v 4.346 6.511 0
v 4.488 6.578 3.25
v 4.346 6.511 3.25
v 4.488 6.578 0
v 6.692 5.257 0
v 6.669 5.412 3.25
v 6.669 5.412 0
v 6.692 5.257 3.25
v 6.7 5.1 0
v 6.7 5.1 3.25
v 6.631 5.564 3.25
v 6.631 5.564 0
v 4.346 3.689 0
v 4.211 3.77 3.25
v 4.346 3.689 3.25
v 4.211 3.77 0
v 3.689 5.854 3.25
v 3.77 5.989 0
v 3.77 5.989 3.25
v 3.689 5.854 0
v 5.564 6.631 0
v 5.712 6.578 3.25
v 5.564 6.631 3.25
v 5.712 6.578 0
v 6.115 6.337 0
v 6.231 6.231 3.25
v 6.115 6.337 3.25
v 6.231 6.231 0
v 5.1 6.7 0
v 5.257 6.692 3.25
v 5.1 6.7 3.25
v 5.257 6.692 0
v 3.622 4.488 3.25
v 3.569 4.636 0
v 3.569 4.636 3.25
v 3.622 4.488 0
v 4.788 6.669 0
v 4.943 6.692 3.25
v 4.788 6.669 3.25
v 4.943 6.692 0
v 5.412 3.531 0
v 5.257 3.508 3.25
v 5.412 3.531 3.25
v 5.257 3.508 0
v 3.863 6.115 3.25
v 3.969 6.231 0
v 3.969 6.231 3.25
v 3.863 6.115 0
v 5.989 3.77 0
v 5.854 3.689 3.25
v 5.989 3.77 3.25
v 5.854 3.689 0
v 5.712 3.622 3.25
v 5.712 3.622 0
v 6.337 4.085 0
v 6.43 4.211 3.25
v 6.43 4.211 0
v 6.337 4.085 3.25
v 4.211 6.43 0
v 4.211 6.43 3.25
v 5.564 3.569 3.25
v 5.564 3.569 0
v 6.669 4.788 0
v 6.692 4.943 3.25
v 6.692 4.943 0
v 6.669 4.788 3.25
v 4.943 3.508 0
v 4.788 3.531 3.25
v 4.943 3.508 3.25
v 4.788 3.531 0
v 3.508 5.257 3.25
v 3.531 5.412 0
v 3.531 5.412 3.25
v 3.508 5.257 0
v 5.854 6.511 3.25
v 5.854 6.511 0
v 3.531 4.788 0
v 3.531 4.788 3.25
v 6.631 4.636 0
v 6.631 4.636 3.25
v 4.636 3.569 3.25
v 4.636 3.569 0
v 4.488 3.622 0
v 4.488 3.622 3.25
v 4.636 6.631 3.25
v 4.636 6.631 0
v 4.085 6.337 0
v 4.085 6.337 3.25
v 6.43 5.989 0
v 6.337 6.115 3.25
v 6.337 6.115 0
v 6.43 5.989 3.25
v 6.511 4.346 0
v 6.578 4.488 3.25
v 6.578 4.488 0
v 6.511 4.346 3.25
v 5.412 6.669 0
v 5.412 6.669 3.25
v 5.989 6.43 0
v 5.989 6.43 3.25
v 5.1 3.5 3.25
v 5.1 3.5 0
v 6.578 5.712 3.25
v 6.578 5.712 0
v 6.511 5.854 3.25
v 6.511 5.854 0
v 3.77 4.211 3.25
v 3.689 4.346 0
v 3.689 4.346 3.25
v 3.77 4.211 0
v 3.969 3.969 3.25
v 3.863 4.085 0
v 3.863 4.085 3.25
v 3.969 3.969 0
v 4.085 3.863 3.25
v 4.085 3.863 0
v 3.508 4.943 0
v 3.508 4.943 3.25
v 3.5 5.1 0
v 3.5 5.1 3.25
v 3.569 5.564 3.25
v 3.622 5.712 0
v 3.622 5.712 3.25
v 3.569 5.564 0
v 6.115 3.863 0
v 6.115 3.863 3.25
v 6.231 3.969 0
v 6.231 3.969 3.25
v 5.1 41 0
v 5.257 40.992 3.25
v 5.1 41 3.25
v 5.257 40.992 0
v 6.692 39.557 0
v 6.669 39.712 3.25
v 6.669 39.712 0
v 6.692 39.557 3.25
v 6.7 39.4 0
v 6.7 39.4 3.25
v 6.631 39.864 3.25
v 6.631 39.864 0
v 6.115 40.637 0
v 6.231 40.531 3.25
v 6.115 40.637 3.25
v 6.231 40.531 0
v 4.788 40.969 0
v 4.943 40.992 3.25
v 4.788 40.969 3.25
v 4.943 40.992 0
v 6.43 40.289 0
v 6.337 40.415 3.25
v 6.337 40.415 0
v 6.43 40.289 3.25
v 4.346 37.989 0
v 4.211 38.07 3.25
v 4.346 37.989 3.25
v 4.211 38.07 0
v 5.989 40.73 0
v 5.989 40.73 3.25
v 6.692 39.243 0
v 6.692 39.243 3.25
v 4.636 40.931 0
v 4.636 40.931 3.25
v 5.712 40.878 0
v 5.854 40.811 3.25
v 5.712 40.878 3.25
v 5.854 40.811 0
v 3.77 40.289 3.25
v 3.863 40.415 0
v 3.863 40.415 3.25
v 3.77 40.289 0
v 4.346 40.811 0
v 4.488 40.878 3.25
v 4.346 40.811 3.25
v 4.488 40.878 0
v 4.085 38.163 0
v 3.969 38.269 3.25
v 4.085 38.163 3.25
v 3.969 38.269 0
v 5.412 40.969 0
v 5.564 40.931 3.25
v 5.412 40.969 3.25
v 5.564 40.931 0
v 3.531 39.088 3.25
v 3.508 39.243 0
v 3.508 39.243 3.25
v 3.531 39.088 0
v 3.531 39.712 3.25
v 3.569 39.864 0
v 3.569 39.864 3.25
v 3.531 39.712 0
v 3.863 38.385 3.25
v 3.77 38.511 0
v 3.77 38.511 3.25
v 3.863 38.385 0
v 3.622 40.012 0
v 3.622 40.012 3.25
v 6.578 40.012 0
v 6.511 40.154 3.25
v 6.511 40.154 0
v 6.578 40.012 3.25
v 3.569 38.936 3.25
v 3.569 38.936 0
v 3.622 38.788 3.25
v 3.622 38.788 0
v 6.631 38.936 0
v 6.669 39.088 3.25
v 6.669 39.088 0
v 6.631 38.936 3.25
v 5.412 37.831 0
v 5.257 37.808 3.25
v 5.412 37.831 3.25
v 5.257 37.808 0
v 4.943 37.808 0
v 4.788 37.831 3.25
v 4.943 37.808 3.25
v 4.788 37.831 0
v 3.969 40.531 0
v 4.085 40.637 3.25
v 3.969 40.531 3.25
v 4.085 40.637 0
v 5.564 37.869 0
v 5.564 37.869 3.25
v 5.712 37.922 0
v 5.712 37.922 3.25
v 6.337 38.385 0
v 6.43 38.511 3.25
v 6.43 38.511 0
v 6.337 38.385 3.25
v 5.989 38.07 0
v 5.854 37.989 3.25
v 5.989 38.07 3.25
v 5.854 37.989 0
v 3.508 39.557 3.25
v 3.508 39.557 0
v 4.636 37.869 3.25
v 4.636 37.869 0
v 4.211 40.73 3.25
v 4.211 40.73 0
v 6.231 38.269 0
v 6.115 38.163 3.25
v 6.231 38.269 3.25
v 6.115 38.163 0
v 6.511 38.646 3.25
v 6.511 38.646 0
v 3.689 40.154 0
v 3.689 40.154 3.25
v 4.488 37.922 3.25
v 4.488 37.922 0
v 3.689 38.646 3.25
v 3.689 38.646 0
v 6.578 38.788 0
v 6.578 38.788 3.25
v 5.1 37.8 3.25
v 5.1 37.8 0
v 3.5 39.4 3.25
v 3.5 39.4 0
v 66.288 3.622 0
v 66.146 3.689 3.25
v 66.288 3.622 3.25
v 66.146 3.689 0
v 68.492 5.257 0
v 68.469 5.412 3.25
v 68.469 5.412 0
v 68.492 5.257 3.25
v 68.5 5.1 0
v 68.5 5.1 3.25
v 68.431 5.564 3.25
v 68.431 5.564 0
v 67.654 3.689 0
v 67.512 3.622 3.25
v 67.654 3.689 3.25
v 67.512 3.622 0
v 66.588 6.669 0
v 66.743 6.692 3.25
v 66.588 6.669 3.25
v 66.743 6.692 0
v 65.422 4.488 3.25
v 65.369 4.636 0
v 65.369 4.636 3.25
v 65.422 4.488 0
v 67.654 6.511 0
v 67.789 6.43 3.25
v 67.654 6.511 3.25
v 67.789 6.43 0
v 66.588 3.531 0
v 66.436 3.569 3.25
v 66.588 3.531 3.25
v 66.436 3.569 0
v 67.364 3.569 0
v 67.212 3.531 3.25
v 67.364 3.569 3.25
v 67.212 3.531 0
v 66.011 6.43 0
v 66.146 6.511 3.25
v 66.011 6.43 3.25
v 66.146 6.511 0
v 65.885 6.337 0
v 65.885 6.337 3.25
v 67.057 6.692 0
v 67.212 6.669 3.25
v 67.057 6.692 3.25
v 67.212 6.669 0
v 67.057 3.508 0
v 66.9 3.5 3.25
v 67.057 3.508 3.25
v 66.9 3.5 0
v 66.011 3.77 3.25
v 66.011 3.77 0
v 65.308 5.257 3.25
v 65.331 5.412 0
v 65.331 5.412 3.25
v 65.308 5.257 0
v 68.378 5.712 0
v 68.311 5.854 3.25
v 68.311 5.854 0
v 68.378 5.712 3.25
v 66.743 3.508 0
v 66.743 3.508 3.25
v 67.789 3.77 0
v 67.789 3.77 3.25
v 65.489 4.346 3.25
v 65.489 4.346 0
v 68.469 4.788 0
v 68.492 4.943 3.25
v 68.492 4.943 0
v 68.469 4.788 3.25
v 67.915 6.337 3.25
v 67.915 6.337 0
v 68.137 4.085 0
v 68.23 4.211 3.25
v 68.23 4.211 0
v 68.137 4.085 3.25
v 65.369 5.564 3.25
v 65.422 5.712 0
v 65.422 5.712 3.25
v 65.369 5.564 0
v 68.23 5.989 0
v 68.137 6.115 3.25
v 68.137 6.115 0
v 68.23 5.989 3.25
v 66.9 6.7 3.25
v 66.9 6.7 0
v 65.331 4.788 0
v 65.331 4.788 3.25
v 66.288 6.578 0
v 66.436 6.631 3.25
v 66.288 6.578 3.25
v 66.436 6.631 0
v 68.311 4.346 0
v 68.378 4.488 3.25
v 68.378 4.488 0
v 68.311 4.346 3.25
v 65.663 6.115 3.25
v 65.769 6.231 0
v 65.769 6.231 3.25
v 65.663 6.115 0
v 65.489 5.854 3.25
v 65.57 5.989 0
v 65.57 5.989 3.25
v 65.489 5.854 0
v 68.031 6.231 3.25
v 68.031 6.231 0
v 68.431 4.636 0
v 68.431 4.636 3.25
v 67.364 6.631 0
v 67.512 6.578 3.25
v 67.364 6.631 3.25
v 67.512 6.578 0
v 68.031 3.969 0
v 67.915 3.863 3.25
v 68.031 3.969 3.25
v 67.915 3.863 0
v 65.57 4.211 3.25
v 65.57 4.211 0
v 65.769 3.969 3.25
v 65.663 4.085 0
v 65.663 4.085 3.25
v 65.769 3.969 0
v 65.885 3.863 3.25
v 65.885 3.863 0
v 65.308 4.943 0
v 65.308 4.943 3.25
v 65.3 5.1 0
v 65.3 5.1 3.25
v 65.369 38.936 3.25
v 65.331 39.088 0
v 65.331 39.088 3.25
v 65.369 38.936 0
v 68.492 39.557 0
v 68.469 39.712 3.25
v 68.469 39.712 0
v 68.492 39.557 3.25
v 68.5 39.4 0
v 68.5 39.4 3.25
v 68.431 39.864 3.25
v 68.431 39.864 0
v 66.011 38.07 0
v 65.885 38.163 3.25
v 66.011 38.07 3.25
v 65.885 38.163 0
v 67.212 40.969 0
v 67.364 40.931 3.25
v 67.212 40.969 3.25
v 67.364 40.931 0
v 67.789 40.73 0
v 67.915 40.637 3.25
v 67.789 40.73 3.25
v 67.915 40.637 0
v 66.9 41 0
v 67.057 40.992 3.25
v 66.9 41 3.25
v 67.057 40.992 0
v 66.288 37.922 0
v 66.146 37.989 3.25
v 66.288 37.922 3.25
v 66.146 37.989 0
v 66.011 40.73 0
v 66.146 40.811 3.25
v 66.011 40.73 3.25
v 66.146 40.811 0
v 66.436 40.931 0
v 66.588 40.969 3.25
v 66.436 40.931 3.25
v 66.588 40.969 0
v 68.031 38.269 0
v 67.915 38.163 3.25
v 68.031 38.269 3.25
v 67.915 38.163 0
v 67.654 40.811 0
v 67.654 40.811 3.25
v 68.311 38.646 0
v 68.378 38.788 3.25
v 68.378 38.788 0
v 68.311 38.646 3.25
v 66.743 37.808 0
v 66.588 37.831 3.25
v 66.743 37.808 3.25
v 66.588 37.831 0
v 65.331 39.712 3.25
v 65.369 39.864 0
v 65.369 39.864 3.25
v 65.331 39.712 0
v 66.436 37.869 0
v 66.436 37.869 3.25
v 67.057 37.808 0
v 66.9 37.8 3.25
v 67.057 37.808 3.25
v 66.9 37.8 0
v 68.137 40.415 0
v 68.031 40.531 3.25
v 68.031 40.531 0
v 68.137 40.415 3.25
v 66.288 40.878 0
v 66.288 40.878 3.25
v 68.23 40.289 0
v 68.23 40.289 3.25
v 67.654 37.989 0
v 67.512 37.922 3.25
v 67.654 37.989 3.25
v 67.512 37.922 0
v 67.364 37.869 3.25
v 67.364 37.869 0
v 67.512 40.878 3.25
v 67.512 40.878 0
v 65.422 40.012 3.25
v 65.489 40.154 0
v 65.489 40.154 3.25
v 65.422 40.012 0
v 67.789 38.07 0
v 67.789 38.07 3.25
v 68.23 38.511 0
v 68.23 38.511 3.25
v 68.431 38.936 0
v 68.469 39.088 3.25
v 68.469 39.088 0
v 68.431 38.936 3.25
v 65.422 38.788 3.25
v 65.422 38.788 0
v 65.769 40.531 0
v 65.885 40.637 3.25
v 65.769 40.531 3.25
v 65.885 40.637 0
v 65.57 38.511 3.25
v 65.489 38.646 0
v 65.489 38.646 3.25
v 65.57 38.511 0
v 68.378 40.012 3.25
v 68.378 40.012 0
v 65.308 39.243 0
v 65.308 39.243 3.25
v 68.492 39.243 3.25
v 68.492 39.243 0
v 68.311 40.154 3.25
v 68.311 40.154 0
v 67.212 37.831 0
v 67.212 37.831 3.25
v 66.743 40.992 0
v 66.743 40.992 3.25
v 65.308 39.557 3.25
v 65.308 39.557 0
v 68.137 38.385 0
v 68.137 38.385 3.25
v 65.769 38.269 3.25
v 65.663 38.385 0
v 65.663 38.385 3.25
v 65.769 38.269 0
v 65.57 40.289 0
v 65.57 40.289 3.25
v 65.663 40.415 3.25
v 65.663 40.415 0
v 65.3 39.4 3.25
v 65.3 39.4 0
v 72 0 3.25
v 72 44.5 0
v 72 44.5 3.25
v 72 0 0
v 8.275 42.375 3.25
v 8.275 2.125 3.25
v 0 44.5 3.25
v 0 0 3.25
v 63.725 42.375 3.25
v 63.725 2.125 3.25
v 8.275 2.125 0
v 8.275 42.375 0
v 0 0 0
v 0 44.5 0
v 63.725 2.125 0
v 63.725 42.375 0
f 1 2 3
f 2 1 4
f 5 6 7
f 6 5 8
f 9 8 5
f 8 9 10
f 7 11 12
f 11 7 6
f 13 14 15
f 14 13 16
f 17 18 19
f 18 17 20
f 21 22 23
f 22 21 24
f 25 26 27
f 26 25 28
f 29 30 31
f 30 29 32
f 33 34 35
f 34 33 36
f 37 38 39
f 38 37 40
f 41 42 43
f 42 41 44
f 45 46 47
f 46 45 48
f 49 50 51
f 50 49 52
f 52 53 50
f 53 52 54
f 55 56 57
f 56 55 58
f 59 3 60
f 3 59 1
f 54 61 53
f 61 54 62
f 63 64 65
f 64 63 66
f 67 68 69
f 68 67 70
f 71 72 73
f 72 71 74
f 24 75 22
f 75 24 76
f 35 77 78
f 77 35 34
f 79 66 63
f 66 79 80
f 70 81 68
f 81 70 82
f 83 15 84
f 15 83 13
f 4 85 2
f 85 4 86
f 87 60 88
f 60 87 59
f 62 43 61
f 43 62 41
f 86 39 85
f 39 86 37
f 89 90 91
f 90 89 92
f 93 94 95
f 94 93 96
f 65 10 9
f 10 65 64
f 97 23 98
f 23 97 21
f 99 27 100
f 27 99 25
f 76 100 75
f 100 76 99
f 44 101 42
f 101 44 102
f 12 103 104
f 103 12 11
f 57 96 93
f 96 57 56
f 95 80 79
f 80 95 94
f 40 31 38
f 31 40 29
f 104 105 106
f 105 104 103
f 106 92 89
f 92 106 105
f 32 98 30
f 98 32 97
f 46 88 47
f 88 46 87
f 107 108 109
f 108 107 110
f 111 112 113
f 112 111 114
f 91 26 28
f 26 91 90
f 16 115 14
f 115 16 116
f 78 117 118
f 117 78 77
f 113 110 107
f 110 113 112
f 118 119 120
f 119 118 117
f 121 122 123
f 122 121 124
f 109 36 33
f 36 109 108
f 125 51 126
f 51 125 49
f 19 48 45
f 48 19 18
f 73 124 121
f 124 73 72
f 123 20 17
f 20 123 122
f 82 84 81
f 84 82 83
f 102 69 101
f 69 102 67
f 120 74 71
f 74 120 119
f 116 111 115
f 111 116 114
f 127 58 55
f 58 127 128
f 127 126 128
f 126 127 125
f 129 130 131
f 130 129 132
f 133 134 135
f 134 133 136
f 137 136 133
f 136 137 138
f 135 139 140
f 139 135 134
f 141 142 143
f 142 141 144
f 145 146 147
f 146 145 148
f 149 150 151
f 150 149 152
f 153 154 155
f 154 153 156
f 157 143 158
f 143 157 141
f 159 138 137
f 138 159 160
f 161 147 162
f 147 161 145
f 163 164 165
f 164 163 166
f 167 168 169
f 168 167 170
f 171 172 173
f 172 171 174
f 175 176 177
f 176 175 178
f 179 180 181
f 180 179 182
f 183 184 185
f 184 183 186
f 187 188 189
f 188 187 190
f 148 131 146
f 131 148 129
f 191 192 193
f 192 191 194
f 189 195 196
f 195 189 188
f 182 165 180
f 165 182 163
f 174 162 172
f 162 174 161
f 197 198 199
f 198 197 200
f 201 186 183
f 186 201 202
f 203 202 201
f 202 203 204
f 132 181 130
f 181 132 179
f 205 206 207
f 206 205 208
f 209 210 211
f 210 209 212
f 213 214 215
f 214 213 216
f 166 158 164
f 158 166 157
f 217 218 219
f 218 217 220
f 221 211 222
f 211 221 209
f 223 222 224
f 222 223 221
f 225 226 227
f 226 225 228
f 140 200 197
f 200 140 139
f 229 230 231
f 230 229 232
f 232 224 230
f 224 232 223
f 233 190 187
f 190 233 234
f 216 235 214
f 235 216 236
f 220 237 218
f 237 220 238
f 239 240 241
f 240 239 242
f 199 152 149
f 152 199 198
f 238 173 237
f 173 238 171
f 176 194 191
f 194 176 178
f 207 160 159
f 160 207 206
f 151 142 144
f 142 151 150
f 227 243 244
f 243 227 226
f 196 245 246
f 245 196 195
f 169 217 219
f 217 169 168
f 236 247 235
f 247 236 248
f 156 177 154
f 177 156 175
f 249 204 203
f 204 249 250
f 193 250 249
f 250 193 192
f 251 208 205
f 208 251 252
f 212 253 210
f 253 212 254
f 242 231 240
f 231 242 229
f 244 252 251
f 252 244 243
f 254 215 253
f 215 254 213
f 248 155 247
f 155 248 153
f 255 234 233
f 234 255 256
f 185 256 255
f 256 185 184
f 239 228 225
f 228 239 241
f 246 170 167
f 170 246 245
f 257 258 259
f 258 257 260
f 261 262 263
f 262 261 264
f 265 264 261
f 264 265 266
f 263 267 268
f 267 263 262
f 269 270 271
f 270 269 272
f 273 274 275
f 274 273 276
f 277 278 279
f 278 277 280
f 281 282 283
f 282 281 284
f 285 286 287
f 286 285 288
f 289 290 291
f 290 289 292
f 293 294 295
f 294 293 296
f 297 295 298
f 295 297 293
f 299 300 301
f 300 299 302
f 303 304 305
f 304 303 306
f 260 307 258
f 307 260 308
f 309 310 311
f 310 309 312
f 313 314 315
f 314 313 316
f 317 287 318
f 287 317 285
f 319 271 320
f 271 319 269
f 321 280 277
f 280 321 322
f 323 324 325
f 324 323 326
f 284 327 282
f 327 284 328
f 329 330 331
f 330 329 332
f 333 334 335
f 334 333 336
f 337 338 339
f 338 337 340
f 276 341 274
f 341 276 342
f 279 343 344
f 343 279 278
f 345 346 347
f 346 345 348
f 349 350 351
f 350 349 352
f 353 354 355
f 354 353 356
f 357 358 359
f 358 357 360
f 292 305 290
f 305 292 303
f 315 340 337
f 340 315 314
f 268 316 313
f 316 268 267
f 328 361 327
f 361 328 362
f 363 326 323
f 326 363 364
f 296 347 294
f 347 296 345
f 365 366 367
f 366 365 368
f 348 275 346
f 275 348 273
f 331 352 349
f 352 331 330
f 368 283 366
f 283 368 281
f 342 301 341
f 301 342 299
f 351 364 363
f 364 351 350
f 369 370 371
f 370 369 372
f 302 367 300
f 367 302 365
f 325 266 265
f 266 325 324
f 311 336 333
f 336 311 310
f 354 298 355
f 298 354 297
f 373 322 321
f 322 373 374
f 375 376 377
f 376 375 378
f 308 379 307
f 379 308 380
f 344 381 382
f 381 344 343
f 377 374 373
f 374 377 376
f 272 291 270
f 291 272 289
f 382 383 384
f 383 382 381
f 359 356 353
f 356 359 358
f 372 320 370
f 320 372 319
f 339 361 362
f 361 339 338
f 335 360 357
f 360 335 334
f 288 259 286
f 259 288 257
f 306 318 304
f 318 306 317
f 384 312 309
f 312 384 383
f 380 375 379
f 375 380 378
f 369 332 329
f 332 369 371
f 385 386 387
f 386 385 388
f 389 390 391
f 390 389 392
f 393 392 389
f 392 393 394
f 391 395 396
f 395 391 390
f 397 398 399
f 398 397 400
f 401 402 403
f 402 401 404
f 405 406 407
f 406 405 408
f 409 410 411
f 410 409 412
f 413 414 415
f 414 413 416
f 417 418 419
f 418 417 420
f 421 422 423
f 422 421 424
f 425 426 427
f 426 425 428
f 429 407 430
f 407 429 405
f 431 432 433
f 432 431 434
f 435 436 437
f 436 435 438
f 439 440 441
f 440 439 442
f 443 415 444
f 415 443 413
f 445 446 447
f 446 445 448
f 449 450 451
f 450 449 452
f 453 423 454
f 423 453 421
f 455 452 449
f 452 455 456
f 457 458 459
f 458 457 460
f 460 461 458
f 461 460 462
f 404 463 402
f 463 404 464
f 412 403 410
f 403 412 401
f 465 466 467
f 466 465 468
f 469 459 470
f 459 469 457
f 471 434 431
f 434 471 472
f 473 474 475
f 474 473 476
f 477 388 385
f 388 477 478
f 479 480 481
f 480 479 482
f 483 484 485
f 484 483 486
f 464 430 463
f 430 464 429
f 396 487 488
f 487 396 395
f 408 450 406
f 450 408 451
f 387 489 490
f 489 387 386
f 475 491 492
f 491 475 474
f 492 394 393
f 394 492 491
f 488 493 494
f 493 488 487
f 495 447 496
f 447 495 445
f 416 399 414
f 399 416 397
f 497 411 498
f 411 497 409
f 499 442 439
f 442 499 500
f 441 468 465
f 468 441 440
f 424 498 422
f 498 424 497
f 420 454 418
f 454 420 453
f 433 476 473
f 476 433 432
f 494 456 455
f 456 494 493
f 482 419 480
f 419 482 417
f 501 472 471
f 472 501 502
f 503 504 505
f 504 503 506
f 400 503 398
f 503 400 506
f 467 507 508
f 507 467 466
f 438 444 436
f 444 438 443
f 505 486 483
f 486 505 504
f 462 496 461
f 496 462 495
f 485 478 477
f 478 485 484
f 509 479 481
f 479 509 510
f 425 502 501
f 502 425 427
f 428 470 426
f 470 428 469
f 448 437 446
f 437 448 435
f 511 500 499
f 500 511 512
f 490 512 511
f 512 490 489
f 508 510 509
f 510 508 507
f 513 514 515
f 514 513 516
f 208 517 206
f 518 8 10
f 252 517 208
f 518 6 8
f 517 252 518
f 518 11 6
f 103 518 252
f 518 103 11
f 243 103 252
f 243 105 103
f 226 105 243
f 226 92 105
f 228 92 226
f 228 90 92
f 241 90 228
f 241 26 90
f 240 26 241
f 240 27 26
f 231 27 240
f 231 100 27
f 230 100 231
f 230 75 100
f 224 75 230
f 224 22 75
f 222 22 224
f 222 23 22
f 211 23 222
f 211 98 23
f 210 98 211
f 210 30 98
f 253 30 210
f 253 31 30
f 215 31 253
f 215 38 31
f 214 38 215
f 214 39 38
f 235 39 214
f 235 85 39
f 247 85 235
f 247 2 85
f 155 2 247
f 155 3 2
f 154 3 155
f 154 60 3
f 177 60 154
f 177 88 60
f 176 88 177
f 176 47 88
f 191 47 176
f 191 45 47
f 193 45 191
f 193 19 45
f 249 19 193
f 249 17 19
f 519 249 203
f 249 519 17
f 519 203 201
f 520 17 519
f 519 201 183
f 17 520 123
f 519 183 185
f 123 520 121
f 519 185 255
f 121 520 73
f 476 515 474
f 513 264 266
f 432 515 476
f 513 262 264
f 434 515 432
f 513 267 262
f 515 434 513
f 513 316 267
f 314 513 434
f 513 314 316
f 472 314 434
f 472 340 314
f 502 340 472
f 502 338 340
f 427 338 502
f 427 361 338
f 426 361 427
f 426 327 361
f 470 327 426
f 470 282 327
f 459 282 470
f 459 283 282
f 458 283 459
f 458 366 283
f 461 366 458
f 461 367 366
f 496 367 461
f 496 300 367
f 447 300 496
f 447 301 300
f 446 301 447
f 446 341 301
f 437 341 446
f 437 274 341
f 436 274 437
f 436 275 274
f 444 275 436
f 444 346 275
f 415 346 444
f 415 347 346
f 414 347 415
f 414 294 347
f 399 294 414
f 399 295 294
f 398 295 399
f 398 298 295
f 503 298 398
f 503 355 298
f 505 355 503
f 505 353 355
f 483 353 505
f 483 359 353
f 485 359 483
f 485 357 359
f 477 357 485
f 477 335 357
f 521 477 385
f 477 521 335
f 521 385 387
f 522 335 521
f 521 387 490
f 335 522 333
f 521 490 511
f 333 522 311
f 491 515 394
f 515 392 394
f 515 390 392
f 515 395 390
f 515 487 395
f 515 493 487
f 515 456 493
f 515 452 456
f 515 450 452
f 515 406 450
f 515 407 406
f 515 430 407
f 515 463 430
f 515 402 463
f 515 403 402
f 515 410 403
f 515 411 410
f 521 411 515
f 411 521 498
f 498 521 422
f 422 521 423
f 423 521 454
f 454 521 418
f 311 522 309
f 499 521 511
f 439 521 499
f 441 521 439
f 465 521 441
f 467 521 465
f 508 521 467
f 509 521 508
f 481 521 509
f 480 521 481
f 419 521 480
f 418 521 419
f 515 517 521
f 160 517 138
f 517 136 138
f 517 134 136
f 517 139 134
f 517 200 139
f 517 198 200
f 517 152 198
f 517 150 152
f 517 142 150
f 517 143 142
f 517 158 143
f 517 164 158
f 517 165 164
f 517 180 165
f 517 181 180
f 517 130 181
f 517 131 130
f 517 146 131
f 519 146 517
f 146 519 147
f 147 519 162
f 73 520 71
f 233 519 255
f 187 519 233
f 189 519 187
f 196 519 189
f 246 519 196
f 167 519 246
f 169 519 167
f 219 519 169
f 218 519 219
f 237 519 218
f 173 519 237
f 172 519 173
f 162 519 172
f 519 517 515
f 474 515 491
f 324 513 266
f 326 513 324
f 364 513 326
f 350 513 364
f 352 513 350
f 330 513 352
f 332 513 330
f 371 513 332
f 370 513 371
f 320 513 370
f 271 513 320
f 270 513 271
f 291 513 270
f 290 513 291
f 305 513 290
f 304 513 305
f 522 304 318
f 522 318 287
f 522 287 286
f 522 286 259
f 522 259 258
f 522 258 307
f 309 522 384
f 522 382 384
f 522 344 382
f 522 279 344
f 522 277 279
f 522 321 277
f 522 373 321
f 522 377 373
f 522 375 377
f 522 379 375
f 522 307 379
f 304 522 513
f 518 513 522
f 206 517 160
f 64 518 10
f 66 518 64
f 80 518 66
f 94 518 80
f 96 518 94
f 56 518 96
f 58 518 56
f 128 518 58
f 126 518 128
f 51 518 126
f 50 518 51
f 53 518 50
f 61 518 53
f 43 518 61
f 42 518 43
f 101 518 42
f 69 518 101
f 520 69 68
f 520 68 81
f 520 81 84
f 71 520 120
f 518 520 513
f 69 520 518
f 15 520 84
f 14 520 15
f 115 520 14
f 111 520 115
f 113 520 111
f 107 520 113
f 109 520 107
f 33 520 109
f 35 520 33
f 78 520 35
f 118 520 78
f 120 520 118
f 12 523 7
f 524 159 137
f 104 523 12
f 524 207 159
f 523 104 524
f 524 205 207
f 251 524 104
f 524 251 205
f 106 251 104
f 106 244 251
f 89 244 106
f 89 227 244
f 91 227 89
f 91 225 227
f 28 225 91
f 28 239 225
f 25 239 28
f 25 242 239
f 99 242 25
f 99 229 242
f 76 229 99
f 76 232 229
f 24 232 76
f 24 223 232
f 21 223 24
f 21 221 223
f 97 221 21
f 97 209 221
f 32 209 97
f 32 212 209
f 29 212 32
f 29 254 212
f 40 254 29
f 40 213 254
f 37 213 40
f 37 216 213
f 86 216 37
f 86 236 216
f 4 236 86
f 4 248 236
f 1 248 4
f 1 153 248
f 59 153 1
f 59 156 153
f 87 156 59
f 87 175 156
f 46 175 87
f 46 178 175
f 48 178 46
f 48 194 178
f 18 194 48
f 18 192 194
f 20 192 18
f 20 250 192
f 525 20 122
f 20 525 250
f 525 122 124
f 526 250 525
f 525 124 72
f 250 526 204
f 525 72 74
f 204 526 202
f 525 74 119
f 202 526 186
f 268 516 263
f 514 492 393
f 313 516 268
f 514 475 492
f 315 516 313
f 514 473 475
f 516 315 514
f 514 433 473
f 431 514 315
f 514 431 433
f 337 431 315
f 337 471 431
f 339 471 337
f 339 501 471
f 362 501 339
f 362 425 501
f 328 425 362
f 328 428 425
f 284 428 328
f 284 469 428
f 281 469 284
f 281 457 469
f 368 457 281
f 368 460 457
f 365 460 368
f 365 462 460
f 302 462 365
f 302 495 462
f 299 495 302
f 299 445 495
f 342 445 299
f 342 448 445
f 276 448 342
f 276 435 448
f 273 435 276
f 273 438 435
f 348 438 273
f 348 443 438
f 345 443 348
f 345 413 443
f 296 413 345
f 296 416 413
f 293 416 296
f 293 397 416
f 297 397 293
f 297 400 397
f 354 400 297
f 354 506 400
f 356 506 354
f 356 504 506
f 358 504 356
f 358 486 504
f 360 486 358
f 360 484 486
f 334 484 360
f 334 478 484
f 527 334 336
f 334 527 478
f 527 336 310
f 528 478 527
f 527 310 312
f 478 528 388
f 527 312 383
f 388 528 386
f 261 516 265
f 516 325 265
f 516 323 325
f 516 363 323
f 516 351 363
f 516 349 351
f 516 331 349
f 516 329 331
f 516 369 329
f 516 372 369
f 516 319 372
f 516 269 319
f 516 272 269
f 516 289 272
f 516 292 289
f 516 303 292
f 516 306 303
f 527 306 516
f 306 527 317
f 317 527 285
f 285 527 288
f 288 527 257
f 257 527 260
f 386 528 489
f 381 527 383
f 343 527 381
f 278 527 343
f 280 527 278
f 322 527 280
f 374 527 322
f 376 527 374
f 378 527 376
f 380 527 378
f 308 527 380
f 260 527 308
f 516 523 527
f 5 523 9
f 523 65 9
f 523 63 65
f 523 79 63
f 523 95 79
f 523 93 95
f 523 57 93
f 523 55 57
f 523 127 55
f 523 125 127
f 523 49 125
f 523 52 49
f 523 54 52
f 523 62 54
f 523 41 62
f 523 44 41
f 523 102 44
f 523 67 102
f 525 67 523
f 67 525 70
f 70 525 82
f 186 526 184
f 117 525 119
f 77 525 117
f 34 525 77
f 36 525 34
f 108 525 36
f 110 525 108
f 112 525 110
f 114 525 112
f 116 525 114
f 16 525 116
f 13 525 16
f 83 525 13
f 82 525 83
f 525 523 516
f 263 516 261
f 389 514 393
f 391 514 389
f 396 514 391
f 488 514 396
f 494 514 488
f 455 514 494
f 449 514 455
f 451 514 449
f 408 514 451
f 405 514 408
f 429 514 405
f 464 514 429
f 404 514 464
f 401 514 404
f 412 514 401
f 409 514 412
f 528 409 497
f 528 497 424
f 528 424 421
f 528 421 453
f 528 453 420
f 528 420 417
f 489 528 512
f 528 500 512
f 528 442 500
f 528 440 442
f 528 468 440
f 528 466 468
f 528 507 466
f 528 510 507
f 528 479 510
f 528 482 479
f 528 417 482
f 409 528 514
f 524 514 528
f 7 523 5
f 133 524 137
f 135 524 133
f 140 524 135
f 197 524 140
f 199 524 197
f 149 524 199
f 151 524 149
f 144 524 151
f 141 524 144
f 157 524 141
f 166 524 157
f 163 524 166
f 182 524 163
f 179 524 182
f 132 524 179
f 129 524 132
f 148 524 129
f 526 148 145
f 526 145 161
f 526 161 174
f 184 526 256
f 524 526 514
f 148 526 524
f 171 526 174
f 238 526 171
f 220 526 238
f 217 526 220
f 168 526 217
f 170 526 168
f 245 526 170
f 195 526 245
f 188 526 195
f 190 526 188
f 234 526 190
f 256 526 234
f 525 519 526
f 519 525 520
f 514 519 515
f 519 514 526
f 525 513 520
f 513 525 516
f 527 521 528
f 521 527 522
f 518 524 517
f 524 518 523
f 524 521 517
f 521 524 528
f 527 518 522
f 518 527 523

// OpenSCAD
// LCD top bezel / faceplate for original 67.5 x 40mm PCB holder

// ===== PARAMETERS =====

pcb_x = 67.5;
pcb_y = 40;

clearance = 0.25;   // per side

wall = 2;

// same footprint as holder
inner_x = pcb_x + clearance * 2;
inner_y = pcb_y + clearance * 2;

outer_x = inner_x + wall * 2;
outer_y = inner_y + wall * 2;

// faceplate thickness
plate_z = 3.25;

// screen/window size
window_x = 55.45;   // height / long direction
window_y = 40.25;   // width / short direction

// screen pocket/recess depth so screen can sit flush
screen_recess_depth = 3;

// position window centrally
window_pos_x = (outer_x - window_x) / 2;
window_pos_y = (outer_y - window_y) / 2;

// M3 clearance holes — same as holder
hole_d = 3.2;
hole_r = hole_d / 2;

// distance from INTERNAL PCB/cavity edge to HOLE EDGE
hole_offset = 1.5;
hole_center_offset = hole_offset + hole_r;

$fn = 64;


// ===== MODEL =====

difference() {
    // main bezel plate
    cube([outer_x, outer_y, plate_z]);

    // recessed screen pocket, 3mm deep from underside/top surface
    translate([window_pos_x, window_pos_y, plate_z - screen_recess_depth])
        cube([window_x, window_y, screen_recess_depth + 0.1]);

    // actual window cutout through remaining face
    translate([window_pos_x, window_pos_y, -0.5])
        cube([window_x, window_y, plate_z + 1]);

    // screw pass-through holes, matching holder
    for (x = [wall + hole_center_offset, wall + inner_x - hole_center_offset])
    for (y = [wall + hole_center_offset, wall + inner_y - hole_center_offset])
        translate([x, y, -0.5])
            cylinder(h = plate_z + 1, d = hole_d);
}
